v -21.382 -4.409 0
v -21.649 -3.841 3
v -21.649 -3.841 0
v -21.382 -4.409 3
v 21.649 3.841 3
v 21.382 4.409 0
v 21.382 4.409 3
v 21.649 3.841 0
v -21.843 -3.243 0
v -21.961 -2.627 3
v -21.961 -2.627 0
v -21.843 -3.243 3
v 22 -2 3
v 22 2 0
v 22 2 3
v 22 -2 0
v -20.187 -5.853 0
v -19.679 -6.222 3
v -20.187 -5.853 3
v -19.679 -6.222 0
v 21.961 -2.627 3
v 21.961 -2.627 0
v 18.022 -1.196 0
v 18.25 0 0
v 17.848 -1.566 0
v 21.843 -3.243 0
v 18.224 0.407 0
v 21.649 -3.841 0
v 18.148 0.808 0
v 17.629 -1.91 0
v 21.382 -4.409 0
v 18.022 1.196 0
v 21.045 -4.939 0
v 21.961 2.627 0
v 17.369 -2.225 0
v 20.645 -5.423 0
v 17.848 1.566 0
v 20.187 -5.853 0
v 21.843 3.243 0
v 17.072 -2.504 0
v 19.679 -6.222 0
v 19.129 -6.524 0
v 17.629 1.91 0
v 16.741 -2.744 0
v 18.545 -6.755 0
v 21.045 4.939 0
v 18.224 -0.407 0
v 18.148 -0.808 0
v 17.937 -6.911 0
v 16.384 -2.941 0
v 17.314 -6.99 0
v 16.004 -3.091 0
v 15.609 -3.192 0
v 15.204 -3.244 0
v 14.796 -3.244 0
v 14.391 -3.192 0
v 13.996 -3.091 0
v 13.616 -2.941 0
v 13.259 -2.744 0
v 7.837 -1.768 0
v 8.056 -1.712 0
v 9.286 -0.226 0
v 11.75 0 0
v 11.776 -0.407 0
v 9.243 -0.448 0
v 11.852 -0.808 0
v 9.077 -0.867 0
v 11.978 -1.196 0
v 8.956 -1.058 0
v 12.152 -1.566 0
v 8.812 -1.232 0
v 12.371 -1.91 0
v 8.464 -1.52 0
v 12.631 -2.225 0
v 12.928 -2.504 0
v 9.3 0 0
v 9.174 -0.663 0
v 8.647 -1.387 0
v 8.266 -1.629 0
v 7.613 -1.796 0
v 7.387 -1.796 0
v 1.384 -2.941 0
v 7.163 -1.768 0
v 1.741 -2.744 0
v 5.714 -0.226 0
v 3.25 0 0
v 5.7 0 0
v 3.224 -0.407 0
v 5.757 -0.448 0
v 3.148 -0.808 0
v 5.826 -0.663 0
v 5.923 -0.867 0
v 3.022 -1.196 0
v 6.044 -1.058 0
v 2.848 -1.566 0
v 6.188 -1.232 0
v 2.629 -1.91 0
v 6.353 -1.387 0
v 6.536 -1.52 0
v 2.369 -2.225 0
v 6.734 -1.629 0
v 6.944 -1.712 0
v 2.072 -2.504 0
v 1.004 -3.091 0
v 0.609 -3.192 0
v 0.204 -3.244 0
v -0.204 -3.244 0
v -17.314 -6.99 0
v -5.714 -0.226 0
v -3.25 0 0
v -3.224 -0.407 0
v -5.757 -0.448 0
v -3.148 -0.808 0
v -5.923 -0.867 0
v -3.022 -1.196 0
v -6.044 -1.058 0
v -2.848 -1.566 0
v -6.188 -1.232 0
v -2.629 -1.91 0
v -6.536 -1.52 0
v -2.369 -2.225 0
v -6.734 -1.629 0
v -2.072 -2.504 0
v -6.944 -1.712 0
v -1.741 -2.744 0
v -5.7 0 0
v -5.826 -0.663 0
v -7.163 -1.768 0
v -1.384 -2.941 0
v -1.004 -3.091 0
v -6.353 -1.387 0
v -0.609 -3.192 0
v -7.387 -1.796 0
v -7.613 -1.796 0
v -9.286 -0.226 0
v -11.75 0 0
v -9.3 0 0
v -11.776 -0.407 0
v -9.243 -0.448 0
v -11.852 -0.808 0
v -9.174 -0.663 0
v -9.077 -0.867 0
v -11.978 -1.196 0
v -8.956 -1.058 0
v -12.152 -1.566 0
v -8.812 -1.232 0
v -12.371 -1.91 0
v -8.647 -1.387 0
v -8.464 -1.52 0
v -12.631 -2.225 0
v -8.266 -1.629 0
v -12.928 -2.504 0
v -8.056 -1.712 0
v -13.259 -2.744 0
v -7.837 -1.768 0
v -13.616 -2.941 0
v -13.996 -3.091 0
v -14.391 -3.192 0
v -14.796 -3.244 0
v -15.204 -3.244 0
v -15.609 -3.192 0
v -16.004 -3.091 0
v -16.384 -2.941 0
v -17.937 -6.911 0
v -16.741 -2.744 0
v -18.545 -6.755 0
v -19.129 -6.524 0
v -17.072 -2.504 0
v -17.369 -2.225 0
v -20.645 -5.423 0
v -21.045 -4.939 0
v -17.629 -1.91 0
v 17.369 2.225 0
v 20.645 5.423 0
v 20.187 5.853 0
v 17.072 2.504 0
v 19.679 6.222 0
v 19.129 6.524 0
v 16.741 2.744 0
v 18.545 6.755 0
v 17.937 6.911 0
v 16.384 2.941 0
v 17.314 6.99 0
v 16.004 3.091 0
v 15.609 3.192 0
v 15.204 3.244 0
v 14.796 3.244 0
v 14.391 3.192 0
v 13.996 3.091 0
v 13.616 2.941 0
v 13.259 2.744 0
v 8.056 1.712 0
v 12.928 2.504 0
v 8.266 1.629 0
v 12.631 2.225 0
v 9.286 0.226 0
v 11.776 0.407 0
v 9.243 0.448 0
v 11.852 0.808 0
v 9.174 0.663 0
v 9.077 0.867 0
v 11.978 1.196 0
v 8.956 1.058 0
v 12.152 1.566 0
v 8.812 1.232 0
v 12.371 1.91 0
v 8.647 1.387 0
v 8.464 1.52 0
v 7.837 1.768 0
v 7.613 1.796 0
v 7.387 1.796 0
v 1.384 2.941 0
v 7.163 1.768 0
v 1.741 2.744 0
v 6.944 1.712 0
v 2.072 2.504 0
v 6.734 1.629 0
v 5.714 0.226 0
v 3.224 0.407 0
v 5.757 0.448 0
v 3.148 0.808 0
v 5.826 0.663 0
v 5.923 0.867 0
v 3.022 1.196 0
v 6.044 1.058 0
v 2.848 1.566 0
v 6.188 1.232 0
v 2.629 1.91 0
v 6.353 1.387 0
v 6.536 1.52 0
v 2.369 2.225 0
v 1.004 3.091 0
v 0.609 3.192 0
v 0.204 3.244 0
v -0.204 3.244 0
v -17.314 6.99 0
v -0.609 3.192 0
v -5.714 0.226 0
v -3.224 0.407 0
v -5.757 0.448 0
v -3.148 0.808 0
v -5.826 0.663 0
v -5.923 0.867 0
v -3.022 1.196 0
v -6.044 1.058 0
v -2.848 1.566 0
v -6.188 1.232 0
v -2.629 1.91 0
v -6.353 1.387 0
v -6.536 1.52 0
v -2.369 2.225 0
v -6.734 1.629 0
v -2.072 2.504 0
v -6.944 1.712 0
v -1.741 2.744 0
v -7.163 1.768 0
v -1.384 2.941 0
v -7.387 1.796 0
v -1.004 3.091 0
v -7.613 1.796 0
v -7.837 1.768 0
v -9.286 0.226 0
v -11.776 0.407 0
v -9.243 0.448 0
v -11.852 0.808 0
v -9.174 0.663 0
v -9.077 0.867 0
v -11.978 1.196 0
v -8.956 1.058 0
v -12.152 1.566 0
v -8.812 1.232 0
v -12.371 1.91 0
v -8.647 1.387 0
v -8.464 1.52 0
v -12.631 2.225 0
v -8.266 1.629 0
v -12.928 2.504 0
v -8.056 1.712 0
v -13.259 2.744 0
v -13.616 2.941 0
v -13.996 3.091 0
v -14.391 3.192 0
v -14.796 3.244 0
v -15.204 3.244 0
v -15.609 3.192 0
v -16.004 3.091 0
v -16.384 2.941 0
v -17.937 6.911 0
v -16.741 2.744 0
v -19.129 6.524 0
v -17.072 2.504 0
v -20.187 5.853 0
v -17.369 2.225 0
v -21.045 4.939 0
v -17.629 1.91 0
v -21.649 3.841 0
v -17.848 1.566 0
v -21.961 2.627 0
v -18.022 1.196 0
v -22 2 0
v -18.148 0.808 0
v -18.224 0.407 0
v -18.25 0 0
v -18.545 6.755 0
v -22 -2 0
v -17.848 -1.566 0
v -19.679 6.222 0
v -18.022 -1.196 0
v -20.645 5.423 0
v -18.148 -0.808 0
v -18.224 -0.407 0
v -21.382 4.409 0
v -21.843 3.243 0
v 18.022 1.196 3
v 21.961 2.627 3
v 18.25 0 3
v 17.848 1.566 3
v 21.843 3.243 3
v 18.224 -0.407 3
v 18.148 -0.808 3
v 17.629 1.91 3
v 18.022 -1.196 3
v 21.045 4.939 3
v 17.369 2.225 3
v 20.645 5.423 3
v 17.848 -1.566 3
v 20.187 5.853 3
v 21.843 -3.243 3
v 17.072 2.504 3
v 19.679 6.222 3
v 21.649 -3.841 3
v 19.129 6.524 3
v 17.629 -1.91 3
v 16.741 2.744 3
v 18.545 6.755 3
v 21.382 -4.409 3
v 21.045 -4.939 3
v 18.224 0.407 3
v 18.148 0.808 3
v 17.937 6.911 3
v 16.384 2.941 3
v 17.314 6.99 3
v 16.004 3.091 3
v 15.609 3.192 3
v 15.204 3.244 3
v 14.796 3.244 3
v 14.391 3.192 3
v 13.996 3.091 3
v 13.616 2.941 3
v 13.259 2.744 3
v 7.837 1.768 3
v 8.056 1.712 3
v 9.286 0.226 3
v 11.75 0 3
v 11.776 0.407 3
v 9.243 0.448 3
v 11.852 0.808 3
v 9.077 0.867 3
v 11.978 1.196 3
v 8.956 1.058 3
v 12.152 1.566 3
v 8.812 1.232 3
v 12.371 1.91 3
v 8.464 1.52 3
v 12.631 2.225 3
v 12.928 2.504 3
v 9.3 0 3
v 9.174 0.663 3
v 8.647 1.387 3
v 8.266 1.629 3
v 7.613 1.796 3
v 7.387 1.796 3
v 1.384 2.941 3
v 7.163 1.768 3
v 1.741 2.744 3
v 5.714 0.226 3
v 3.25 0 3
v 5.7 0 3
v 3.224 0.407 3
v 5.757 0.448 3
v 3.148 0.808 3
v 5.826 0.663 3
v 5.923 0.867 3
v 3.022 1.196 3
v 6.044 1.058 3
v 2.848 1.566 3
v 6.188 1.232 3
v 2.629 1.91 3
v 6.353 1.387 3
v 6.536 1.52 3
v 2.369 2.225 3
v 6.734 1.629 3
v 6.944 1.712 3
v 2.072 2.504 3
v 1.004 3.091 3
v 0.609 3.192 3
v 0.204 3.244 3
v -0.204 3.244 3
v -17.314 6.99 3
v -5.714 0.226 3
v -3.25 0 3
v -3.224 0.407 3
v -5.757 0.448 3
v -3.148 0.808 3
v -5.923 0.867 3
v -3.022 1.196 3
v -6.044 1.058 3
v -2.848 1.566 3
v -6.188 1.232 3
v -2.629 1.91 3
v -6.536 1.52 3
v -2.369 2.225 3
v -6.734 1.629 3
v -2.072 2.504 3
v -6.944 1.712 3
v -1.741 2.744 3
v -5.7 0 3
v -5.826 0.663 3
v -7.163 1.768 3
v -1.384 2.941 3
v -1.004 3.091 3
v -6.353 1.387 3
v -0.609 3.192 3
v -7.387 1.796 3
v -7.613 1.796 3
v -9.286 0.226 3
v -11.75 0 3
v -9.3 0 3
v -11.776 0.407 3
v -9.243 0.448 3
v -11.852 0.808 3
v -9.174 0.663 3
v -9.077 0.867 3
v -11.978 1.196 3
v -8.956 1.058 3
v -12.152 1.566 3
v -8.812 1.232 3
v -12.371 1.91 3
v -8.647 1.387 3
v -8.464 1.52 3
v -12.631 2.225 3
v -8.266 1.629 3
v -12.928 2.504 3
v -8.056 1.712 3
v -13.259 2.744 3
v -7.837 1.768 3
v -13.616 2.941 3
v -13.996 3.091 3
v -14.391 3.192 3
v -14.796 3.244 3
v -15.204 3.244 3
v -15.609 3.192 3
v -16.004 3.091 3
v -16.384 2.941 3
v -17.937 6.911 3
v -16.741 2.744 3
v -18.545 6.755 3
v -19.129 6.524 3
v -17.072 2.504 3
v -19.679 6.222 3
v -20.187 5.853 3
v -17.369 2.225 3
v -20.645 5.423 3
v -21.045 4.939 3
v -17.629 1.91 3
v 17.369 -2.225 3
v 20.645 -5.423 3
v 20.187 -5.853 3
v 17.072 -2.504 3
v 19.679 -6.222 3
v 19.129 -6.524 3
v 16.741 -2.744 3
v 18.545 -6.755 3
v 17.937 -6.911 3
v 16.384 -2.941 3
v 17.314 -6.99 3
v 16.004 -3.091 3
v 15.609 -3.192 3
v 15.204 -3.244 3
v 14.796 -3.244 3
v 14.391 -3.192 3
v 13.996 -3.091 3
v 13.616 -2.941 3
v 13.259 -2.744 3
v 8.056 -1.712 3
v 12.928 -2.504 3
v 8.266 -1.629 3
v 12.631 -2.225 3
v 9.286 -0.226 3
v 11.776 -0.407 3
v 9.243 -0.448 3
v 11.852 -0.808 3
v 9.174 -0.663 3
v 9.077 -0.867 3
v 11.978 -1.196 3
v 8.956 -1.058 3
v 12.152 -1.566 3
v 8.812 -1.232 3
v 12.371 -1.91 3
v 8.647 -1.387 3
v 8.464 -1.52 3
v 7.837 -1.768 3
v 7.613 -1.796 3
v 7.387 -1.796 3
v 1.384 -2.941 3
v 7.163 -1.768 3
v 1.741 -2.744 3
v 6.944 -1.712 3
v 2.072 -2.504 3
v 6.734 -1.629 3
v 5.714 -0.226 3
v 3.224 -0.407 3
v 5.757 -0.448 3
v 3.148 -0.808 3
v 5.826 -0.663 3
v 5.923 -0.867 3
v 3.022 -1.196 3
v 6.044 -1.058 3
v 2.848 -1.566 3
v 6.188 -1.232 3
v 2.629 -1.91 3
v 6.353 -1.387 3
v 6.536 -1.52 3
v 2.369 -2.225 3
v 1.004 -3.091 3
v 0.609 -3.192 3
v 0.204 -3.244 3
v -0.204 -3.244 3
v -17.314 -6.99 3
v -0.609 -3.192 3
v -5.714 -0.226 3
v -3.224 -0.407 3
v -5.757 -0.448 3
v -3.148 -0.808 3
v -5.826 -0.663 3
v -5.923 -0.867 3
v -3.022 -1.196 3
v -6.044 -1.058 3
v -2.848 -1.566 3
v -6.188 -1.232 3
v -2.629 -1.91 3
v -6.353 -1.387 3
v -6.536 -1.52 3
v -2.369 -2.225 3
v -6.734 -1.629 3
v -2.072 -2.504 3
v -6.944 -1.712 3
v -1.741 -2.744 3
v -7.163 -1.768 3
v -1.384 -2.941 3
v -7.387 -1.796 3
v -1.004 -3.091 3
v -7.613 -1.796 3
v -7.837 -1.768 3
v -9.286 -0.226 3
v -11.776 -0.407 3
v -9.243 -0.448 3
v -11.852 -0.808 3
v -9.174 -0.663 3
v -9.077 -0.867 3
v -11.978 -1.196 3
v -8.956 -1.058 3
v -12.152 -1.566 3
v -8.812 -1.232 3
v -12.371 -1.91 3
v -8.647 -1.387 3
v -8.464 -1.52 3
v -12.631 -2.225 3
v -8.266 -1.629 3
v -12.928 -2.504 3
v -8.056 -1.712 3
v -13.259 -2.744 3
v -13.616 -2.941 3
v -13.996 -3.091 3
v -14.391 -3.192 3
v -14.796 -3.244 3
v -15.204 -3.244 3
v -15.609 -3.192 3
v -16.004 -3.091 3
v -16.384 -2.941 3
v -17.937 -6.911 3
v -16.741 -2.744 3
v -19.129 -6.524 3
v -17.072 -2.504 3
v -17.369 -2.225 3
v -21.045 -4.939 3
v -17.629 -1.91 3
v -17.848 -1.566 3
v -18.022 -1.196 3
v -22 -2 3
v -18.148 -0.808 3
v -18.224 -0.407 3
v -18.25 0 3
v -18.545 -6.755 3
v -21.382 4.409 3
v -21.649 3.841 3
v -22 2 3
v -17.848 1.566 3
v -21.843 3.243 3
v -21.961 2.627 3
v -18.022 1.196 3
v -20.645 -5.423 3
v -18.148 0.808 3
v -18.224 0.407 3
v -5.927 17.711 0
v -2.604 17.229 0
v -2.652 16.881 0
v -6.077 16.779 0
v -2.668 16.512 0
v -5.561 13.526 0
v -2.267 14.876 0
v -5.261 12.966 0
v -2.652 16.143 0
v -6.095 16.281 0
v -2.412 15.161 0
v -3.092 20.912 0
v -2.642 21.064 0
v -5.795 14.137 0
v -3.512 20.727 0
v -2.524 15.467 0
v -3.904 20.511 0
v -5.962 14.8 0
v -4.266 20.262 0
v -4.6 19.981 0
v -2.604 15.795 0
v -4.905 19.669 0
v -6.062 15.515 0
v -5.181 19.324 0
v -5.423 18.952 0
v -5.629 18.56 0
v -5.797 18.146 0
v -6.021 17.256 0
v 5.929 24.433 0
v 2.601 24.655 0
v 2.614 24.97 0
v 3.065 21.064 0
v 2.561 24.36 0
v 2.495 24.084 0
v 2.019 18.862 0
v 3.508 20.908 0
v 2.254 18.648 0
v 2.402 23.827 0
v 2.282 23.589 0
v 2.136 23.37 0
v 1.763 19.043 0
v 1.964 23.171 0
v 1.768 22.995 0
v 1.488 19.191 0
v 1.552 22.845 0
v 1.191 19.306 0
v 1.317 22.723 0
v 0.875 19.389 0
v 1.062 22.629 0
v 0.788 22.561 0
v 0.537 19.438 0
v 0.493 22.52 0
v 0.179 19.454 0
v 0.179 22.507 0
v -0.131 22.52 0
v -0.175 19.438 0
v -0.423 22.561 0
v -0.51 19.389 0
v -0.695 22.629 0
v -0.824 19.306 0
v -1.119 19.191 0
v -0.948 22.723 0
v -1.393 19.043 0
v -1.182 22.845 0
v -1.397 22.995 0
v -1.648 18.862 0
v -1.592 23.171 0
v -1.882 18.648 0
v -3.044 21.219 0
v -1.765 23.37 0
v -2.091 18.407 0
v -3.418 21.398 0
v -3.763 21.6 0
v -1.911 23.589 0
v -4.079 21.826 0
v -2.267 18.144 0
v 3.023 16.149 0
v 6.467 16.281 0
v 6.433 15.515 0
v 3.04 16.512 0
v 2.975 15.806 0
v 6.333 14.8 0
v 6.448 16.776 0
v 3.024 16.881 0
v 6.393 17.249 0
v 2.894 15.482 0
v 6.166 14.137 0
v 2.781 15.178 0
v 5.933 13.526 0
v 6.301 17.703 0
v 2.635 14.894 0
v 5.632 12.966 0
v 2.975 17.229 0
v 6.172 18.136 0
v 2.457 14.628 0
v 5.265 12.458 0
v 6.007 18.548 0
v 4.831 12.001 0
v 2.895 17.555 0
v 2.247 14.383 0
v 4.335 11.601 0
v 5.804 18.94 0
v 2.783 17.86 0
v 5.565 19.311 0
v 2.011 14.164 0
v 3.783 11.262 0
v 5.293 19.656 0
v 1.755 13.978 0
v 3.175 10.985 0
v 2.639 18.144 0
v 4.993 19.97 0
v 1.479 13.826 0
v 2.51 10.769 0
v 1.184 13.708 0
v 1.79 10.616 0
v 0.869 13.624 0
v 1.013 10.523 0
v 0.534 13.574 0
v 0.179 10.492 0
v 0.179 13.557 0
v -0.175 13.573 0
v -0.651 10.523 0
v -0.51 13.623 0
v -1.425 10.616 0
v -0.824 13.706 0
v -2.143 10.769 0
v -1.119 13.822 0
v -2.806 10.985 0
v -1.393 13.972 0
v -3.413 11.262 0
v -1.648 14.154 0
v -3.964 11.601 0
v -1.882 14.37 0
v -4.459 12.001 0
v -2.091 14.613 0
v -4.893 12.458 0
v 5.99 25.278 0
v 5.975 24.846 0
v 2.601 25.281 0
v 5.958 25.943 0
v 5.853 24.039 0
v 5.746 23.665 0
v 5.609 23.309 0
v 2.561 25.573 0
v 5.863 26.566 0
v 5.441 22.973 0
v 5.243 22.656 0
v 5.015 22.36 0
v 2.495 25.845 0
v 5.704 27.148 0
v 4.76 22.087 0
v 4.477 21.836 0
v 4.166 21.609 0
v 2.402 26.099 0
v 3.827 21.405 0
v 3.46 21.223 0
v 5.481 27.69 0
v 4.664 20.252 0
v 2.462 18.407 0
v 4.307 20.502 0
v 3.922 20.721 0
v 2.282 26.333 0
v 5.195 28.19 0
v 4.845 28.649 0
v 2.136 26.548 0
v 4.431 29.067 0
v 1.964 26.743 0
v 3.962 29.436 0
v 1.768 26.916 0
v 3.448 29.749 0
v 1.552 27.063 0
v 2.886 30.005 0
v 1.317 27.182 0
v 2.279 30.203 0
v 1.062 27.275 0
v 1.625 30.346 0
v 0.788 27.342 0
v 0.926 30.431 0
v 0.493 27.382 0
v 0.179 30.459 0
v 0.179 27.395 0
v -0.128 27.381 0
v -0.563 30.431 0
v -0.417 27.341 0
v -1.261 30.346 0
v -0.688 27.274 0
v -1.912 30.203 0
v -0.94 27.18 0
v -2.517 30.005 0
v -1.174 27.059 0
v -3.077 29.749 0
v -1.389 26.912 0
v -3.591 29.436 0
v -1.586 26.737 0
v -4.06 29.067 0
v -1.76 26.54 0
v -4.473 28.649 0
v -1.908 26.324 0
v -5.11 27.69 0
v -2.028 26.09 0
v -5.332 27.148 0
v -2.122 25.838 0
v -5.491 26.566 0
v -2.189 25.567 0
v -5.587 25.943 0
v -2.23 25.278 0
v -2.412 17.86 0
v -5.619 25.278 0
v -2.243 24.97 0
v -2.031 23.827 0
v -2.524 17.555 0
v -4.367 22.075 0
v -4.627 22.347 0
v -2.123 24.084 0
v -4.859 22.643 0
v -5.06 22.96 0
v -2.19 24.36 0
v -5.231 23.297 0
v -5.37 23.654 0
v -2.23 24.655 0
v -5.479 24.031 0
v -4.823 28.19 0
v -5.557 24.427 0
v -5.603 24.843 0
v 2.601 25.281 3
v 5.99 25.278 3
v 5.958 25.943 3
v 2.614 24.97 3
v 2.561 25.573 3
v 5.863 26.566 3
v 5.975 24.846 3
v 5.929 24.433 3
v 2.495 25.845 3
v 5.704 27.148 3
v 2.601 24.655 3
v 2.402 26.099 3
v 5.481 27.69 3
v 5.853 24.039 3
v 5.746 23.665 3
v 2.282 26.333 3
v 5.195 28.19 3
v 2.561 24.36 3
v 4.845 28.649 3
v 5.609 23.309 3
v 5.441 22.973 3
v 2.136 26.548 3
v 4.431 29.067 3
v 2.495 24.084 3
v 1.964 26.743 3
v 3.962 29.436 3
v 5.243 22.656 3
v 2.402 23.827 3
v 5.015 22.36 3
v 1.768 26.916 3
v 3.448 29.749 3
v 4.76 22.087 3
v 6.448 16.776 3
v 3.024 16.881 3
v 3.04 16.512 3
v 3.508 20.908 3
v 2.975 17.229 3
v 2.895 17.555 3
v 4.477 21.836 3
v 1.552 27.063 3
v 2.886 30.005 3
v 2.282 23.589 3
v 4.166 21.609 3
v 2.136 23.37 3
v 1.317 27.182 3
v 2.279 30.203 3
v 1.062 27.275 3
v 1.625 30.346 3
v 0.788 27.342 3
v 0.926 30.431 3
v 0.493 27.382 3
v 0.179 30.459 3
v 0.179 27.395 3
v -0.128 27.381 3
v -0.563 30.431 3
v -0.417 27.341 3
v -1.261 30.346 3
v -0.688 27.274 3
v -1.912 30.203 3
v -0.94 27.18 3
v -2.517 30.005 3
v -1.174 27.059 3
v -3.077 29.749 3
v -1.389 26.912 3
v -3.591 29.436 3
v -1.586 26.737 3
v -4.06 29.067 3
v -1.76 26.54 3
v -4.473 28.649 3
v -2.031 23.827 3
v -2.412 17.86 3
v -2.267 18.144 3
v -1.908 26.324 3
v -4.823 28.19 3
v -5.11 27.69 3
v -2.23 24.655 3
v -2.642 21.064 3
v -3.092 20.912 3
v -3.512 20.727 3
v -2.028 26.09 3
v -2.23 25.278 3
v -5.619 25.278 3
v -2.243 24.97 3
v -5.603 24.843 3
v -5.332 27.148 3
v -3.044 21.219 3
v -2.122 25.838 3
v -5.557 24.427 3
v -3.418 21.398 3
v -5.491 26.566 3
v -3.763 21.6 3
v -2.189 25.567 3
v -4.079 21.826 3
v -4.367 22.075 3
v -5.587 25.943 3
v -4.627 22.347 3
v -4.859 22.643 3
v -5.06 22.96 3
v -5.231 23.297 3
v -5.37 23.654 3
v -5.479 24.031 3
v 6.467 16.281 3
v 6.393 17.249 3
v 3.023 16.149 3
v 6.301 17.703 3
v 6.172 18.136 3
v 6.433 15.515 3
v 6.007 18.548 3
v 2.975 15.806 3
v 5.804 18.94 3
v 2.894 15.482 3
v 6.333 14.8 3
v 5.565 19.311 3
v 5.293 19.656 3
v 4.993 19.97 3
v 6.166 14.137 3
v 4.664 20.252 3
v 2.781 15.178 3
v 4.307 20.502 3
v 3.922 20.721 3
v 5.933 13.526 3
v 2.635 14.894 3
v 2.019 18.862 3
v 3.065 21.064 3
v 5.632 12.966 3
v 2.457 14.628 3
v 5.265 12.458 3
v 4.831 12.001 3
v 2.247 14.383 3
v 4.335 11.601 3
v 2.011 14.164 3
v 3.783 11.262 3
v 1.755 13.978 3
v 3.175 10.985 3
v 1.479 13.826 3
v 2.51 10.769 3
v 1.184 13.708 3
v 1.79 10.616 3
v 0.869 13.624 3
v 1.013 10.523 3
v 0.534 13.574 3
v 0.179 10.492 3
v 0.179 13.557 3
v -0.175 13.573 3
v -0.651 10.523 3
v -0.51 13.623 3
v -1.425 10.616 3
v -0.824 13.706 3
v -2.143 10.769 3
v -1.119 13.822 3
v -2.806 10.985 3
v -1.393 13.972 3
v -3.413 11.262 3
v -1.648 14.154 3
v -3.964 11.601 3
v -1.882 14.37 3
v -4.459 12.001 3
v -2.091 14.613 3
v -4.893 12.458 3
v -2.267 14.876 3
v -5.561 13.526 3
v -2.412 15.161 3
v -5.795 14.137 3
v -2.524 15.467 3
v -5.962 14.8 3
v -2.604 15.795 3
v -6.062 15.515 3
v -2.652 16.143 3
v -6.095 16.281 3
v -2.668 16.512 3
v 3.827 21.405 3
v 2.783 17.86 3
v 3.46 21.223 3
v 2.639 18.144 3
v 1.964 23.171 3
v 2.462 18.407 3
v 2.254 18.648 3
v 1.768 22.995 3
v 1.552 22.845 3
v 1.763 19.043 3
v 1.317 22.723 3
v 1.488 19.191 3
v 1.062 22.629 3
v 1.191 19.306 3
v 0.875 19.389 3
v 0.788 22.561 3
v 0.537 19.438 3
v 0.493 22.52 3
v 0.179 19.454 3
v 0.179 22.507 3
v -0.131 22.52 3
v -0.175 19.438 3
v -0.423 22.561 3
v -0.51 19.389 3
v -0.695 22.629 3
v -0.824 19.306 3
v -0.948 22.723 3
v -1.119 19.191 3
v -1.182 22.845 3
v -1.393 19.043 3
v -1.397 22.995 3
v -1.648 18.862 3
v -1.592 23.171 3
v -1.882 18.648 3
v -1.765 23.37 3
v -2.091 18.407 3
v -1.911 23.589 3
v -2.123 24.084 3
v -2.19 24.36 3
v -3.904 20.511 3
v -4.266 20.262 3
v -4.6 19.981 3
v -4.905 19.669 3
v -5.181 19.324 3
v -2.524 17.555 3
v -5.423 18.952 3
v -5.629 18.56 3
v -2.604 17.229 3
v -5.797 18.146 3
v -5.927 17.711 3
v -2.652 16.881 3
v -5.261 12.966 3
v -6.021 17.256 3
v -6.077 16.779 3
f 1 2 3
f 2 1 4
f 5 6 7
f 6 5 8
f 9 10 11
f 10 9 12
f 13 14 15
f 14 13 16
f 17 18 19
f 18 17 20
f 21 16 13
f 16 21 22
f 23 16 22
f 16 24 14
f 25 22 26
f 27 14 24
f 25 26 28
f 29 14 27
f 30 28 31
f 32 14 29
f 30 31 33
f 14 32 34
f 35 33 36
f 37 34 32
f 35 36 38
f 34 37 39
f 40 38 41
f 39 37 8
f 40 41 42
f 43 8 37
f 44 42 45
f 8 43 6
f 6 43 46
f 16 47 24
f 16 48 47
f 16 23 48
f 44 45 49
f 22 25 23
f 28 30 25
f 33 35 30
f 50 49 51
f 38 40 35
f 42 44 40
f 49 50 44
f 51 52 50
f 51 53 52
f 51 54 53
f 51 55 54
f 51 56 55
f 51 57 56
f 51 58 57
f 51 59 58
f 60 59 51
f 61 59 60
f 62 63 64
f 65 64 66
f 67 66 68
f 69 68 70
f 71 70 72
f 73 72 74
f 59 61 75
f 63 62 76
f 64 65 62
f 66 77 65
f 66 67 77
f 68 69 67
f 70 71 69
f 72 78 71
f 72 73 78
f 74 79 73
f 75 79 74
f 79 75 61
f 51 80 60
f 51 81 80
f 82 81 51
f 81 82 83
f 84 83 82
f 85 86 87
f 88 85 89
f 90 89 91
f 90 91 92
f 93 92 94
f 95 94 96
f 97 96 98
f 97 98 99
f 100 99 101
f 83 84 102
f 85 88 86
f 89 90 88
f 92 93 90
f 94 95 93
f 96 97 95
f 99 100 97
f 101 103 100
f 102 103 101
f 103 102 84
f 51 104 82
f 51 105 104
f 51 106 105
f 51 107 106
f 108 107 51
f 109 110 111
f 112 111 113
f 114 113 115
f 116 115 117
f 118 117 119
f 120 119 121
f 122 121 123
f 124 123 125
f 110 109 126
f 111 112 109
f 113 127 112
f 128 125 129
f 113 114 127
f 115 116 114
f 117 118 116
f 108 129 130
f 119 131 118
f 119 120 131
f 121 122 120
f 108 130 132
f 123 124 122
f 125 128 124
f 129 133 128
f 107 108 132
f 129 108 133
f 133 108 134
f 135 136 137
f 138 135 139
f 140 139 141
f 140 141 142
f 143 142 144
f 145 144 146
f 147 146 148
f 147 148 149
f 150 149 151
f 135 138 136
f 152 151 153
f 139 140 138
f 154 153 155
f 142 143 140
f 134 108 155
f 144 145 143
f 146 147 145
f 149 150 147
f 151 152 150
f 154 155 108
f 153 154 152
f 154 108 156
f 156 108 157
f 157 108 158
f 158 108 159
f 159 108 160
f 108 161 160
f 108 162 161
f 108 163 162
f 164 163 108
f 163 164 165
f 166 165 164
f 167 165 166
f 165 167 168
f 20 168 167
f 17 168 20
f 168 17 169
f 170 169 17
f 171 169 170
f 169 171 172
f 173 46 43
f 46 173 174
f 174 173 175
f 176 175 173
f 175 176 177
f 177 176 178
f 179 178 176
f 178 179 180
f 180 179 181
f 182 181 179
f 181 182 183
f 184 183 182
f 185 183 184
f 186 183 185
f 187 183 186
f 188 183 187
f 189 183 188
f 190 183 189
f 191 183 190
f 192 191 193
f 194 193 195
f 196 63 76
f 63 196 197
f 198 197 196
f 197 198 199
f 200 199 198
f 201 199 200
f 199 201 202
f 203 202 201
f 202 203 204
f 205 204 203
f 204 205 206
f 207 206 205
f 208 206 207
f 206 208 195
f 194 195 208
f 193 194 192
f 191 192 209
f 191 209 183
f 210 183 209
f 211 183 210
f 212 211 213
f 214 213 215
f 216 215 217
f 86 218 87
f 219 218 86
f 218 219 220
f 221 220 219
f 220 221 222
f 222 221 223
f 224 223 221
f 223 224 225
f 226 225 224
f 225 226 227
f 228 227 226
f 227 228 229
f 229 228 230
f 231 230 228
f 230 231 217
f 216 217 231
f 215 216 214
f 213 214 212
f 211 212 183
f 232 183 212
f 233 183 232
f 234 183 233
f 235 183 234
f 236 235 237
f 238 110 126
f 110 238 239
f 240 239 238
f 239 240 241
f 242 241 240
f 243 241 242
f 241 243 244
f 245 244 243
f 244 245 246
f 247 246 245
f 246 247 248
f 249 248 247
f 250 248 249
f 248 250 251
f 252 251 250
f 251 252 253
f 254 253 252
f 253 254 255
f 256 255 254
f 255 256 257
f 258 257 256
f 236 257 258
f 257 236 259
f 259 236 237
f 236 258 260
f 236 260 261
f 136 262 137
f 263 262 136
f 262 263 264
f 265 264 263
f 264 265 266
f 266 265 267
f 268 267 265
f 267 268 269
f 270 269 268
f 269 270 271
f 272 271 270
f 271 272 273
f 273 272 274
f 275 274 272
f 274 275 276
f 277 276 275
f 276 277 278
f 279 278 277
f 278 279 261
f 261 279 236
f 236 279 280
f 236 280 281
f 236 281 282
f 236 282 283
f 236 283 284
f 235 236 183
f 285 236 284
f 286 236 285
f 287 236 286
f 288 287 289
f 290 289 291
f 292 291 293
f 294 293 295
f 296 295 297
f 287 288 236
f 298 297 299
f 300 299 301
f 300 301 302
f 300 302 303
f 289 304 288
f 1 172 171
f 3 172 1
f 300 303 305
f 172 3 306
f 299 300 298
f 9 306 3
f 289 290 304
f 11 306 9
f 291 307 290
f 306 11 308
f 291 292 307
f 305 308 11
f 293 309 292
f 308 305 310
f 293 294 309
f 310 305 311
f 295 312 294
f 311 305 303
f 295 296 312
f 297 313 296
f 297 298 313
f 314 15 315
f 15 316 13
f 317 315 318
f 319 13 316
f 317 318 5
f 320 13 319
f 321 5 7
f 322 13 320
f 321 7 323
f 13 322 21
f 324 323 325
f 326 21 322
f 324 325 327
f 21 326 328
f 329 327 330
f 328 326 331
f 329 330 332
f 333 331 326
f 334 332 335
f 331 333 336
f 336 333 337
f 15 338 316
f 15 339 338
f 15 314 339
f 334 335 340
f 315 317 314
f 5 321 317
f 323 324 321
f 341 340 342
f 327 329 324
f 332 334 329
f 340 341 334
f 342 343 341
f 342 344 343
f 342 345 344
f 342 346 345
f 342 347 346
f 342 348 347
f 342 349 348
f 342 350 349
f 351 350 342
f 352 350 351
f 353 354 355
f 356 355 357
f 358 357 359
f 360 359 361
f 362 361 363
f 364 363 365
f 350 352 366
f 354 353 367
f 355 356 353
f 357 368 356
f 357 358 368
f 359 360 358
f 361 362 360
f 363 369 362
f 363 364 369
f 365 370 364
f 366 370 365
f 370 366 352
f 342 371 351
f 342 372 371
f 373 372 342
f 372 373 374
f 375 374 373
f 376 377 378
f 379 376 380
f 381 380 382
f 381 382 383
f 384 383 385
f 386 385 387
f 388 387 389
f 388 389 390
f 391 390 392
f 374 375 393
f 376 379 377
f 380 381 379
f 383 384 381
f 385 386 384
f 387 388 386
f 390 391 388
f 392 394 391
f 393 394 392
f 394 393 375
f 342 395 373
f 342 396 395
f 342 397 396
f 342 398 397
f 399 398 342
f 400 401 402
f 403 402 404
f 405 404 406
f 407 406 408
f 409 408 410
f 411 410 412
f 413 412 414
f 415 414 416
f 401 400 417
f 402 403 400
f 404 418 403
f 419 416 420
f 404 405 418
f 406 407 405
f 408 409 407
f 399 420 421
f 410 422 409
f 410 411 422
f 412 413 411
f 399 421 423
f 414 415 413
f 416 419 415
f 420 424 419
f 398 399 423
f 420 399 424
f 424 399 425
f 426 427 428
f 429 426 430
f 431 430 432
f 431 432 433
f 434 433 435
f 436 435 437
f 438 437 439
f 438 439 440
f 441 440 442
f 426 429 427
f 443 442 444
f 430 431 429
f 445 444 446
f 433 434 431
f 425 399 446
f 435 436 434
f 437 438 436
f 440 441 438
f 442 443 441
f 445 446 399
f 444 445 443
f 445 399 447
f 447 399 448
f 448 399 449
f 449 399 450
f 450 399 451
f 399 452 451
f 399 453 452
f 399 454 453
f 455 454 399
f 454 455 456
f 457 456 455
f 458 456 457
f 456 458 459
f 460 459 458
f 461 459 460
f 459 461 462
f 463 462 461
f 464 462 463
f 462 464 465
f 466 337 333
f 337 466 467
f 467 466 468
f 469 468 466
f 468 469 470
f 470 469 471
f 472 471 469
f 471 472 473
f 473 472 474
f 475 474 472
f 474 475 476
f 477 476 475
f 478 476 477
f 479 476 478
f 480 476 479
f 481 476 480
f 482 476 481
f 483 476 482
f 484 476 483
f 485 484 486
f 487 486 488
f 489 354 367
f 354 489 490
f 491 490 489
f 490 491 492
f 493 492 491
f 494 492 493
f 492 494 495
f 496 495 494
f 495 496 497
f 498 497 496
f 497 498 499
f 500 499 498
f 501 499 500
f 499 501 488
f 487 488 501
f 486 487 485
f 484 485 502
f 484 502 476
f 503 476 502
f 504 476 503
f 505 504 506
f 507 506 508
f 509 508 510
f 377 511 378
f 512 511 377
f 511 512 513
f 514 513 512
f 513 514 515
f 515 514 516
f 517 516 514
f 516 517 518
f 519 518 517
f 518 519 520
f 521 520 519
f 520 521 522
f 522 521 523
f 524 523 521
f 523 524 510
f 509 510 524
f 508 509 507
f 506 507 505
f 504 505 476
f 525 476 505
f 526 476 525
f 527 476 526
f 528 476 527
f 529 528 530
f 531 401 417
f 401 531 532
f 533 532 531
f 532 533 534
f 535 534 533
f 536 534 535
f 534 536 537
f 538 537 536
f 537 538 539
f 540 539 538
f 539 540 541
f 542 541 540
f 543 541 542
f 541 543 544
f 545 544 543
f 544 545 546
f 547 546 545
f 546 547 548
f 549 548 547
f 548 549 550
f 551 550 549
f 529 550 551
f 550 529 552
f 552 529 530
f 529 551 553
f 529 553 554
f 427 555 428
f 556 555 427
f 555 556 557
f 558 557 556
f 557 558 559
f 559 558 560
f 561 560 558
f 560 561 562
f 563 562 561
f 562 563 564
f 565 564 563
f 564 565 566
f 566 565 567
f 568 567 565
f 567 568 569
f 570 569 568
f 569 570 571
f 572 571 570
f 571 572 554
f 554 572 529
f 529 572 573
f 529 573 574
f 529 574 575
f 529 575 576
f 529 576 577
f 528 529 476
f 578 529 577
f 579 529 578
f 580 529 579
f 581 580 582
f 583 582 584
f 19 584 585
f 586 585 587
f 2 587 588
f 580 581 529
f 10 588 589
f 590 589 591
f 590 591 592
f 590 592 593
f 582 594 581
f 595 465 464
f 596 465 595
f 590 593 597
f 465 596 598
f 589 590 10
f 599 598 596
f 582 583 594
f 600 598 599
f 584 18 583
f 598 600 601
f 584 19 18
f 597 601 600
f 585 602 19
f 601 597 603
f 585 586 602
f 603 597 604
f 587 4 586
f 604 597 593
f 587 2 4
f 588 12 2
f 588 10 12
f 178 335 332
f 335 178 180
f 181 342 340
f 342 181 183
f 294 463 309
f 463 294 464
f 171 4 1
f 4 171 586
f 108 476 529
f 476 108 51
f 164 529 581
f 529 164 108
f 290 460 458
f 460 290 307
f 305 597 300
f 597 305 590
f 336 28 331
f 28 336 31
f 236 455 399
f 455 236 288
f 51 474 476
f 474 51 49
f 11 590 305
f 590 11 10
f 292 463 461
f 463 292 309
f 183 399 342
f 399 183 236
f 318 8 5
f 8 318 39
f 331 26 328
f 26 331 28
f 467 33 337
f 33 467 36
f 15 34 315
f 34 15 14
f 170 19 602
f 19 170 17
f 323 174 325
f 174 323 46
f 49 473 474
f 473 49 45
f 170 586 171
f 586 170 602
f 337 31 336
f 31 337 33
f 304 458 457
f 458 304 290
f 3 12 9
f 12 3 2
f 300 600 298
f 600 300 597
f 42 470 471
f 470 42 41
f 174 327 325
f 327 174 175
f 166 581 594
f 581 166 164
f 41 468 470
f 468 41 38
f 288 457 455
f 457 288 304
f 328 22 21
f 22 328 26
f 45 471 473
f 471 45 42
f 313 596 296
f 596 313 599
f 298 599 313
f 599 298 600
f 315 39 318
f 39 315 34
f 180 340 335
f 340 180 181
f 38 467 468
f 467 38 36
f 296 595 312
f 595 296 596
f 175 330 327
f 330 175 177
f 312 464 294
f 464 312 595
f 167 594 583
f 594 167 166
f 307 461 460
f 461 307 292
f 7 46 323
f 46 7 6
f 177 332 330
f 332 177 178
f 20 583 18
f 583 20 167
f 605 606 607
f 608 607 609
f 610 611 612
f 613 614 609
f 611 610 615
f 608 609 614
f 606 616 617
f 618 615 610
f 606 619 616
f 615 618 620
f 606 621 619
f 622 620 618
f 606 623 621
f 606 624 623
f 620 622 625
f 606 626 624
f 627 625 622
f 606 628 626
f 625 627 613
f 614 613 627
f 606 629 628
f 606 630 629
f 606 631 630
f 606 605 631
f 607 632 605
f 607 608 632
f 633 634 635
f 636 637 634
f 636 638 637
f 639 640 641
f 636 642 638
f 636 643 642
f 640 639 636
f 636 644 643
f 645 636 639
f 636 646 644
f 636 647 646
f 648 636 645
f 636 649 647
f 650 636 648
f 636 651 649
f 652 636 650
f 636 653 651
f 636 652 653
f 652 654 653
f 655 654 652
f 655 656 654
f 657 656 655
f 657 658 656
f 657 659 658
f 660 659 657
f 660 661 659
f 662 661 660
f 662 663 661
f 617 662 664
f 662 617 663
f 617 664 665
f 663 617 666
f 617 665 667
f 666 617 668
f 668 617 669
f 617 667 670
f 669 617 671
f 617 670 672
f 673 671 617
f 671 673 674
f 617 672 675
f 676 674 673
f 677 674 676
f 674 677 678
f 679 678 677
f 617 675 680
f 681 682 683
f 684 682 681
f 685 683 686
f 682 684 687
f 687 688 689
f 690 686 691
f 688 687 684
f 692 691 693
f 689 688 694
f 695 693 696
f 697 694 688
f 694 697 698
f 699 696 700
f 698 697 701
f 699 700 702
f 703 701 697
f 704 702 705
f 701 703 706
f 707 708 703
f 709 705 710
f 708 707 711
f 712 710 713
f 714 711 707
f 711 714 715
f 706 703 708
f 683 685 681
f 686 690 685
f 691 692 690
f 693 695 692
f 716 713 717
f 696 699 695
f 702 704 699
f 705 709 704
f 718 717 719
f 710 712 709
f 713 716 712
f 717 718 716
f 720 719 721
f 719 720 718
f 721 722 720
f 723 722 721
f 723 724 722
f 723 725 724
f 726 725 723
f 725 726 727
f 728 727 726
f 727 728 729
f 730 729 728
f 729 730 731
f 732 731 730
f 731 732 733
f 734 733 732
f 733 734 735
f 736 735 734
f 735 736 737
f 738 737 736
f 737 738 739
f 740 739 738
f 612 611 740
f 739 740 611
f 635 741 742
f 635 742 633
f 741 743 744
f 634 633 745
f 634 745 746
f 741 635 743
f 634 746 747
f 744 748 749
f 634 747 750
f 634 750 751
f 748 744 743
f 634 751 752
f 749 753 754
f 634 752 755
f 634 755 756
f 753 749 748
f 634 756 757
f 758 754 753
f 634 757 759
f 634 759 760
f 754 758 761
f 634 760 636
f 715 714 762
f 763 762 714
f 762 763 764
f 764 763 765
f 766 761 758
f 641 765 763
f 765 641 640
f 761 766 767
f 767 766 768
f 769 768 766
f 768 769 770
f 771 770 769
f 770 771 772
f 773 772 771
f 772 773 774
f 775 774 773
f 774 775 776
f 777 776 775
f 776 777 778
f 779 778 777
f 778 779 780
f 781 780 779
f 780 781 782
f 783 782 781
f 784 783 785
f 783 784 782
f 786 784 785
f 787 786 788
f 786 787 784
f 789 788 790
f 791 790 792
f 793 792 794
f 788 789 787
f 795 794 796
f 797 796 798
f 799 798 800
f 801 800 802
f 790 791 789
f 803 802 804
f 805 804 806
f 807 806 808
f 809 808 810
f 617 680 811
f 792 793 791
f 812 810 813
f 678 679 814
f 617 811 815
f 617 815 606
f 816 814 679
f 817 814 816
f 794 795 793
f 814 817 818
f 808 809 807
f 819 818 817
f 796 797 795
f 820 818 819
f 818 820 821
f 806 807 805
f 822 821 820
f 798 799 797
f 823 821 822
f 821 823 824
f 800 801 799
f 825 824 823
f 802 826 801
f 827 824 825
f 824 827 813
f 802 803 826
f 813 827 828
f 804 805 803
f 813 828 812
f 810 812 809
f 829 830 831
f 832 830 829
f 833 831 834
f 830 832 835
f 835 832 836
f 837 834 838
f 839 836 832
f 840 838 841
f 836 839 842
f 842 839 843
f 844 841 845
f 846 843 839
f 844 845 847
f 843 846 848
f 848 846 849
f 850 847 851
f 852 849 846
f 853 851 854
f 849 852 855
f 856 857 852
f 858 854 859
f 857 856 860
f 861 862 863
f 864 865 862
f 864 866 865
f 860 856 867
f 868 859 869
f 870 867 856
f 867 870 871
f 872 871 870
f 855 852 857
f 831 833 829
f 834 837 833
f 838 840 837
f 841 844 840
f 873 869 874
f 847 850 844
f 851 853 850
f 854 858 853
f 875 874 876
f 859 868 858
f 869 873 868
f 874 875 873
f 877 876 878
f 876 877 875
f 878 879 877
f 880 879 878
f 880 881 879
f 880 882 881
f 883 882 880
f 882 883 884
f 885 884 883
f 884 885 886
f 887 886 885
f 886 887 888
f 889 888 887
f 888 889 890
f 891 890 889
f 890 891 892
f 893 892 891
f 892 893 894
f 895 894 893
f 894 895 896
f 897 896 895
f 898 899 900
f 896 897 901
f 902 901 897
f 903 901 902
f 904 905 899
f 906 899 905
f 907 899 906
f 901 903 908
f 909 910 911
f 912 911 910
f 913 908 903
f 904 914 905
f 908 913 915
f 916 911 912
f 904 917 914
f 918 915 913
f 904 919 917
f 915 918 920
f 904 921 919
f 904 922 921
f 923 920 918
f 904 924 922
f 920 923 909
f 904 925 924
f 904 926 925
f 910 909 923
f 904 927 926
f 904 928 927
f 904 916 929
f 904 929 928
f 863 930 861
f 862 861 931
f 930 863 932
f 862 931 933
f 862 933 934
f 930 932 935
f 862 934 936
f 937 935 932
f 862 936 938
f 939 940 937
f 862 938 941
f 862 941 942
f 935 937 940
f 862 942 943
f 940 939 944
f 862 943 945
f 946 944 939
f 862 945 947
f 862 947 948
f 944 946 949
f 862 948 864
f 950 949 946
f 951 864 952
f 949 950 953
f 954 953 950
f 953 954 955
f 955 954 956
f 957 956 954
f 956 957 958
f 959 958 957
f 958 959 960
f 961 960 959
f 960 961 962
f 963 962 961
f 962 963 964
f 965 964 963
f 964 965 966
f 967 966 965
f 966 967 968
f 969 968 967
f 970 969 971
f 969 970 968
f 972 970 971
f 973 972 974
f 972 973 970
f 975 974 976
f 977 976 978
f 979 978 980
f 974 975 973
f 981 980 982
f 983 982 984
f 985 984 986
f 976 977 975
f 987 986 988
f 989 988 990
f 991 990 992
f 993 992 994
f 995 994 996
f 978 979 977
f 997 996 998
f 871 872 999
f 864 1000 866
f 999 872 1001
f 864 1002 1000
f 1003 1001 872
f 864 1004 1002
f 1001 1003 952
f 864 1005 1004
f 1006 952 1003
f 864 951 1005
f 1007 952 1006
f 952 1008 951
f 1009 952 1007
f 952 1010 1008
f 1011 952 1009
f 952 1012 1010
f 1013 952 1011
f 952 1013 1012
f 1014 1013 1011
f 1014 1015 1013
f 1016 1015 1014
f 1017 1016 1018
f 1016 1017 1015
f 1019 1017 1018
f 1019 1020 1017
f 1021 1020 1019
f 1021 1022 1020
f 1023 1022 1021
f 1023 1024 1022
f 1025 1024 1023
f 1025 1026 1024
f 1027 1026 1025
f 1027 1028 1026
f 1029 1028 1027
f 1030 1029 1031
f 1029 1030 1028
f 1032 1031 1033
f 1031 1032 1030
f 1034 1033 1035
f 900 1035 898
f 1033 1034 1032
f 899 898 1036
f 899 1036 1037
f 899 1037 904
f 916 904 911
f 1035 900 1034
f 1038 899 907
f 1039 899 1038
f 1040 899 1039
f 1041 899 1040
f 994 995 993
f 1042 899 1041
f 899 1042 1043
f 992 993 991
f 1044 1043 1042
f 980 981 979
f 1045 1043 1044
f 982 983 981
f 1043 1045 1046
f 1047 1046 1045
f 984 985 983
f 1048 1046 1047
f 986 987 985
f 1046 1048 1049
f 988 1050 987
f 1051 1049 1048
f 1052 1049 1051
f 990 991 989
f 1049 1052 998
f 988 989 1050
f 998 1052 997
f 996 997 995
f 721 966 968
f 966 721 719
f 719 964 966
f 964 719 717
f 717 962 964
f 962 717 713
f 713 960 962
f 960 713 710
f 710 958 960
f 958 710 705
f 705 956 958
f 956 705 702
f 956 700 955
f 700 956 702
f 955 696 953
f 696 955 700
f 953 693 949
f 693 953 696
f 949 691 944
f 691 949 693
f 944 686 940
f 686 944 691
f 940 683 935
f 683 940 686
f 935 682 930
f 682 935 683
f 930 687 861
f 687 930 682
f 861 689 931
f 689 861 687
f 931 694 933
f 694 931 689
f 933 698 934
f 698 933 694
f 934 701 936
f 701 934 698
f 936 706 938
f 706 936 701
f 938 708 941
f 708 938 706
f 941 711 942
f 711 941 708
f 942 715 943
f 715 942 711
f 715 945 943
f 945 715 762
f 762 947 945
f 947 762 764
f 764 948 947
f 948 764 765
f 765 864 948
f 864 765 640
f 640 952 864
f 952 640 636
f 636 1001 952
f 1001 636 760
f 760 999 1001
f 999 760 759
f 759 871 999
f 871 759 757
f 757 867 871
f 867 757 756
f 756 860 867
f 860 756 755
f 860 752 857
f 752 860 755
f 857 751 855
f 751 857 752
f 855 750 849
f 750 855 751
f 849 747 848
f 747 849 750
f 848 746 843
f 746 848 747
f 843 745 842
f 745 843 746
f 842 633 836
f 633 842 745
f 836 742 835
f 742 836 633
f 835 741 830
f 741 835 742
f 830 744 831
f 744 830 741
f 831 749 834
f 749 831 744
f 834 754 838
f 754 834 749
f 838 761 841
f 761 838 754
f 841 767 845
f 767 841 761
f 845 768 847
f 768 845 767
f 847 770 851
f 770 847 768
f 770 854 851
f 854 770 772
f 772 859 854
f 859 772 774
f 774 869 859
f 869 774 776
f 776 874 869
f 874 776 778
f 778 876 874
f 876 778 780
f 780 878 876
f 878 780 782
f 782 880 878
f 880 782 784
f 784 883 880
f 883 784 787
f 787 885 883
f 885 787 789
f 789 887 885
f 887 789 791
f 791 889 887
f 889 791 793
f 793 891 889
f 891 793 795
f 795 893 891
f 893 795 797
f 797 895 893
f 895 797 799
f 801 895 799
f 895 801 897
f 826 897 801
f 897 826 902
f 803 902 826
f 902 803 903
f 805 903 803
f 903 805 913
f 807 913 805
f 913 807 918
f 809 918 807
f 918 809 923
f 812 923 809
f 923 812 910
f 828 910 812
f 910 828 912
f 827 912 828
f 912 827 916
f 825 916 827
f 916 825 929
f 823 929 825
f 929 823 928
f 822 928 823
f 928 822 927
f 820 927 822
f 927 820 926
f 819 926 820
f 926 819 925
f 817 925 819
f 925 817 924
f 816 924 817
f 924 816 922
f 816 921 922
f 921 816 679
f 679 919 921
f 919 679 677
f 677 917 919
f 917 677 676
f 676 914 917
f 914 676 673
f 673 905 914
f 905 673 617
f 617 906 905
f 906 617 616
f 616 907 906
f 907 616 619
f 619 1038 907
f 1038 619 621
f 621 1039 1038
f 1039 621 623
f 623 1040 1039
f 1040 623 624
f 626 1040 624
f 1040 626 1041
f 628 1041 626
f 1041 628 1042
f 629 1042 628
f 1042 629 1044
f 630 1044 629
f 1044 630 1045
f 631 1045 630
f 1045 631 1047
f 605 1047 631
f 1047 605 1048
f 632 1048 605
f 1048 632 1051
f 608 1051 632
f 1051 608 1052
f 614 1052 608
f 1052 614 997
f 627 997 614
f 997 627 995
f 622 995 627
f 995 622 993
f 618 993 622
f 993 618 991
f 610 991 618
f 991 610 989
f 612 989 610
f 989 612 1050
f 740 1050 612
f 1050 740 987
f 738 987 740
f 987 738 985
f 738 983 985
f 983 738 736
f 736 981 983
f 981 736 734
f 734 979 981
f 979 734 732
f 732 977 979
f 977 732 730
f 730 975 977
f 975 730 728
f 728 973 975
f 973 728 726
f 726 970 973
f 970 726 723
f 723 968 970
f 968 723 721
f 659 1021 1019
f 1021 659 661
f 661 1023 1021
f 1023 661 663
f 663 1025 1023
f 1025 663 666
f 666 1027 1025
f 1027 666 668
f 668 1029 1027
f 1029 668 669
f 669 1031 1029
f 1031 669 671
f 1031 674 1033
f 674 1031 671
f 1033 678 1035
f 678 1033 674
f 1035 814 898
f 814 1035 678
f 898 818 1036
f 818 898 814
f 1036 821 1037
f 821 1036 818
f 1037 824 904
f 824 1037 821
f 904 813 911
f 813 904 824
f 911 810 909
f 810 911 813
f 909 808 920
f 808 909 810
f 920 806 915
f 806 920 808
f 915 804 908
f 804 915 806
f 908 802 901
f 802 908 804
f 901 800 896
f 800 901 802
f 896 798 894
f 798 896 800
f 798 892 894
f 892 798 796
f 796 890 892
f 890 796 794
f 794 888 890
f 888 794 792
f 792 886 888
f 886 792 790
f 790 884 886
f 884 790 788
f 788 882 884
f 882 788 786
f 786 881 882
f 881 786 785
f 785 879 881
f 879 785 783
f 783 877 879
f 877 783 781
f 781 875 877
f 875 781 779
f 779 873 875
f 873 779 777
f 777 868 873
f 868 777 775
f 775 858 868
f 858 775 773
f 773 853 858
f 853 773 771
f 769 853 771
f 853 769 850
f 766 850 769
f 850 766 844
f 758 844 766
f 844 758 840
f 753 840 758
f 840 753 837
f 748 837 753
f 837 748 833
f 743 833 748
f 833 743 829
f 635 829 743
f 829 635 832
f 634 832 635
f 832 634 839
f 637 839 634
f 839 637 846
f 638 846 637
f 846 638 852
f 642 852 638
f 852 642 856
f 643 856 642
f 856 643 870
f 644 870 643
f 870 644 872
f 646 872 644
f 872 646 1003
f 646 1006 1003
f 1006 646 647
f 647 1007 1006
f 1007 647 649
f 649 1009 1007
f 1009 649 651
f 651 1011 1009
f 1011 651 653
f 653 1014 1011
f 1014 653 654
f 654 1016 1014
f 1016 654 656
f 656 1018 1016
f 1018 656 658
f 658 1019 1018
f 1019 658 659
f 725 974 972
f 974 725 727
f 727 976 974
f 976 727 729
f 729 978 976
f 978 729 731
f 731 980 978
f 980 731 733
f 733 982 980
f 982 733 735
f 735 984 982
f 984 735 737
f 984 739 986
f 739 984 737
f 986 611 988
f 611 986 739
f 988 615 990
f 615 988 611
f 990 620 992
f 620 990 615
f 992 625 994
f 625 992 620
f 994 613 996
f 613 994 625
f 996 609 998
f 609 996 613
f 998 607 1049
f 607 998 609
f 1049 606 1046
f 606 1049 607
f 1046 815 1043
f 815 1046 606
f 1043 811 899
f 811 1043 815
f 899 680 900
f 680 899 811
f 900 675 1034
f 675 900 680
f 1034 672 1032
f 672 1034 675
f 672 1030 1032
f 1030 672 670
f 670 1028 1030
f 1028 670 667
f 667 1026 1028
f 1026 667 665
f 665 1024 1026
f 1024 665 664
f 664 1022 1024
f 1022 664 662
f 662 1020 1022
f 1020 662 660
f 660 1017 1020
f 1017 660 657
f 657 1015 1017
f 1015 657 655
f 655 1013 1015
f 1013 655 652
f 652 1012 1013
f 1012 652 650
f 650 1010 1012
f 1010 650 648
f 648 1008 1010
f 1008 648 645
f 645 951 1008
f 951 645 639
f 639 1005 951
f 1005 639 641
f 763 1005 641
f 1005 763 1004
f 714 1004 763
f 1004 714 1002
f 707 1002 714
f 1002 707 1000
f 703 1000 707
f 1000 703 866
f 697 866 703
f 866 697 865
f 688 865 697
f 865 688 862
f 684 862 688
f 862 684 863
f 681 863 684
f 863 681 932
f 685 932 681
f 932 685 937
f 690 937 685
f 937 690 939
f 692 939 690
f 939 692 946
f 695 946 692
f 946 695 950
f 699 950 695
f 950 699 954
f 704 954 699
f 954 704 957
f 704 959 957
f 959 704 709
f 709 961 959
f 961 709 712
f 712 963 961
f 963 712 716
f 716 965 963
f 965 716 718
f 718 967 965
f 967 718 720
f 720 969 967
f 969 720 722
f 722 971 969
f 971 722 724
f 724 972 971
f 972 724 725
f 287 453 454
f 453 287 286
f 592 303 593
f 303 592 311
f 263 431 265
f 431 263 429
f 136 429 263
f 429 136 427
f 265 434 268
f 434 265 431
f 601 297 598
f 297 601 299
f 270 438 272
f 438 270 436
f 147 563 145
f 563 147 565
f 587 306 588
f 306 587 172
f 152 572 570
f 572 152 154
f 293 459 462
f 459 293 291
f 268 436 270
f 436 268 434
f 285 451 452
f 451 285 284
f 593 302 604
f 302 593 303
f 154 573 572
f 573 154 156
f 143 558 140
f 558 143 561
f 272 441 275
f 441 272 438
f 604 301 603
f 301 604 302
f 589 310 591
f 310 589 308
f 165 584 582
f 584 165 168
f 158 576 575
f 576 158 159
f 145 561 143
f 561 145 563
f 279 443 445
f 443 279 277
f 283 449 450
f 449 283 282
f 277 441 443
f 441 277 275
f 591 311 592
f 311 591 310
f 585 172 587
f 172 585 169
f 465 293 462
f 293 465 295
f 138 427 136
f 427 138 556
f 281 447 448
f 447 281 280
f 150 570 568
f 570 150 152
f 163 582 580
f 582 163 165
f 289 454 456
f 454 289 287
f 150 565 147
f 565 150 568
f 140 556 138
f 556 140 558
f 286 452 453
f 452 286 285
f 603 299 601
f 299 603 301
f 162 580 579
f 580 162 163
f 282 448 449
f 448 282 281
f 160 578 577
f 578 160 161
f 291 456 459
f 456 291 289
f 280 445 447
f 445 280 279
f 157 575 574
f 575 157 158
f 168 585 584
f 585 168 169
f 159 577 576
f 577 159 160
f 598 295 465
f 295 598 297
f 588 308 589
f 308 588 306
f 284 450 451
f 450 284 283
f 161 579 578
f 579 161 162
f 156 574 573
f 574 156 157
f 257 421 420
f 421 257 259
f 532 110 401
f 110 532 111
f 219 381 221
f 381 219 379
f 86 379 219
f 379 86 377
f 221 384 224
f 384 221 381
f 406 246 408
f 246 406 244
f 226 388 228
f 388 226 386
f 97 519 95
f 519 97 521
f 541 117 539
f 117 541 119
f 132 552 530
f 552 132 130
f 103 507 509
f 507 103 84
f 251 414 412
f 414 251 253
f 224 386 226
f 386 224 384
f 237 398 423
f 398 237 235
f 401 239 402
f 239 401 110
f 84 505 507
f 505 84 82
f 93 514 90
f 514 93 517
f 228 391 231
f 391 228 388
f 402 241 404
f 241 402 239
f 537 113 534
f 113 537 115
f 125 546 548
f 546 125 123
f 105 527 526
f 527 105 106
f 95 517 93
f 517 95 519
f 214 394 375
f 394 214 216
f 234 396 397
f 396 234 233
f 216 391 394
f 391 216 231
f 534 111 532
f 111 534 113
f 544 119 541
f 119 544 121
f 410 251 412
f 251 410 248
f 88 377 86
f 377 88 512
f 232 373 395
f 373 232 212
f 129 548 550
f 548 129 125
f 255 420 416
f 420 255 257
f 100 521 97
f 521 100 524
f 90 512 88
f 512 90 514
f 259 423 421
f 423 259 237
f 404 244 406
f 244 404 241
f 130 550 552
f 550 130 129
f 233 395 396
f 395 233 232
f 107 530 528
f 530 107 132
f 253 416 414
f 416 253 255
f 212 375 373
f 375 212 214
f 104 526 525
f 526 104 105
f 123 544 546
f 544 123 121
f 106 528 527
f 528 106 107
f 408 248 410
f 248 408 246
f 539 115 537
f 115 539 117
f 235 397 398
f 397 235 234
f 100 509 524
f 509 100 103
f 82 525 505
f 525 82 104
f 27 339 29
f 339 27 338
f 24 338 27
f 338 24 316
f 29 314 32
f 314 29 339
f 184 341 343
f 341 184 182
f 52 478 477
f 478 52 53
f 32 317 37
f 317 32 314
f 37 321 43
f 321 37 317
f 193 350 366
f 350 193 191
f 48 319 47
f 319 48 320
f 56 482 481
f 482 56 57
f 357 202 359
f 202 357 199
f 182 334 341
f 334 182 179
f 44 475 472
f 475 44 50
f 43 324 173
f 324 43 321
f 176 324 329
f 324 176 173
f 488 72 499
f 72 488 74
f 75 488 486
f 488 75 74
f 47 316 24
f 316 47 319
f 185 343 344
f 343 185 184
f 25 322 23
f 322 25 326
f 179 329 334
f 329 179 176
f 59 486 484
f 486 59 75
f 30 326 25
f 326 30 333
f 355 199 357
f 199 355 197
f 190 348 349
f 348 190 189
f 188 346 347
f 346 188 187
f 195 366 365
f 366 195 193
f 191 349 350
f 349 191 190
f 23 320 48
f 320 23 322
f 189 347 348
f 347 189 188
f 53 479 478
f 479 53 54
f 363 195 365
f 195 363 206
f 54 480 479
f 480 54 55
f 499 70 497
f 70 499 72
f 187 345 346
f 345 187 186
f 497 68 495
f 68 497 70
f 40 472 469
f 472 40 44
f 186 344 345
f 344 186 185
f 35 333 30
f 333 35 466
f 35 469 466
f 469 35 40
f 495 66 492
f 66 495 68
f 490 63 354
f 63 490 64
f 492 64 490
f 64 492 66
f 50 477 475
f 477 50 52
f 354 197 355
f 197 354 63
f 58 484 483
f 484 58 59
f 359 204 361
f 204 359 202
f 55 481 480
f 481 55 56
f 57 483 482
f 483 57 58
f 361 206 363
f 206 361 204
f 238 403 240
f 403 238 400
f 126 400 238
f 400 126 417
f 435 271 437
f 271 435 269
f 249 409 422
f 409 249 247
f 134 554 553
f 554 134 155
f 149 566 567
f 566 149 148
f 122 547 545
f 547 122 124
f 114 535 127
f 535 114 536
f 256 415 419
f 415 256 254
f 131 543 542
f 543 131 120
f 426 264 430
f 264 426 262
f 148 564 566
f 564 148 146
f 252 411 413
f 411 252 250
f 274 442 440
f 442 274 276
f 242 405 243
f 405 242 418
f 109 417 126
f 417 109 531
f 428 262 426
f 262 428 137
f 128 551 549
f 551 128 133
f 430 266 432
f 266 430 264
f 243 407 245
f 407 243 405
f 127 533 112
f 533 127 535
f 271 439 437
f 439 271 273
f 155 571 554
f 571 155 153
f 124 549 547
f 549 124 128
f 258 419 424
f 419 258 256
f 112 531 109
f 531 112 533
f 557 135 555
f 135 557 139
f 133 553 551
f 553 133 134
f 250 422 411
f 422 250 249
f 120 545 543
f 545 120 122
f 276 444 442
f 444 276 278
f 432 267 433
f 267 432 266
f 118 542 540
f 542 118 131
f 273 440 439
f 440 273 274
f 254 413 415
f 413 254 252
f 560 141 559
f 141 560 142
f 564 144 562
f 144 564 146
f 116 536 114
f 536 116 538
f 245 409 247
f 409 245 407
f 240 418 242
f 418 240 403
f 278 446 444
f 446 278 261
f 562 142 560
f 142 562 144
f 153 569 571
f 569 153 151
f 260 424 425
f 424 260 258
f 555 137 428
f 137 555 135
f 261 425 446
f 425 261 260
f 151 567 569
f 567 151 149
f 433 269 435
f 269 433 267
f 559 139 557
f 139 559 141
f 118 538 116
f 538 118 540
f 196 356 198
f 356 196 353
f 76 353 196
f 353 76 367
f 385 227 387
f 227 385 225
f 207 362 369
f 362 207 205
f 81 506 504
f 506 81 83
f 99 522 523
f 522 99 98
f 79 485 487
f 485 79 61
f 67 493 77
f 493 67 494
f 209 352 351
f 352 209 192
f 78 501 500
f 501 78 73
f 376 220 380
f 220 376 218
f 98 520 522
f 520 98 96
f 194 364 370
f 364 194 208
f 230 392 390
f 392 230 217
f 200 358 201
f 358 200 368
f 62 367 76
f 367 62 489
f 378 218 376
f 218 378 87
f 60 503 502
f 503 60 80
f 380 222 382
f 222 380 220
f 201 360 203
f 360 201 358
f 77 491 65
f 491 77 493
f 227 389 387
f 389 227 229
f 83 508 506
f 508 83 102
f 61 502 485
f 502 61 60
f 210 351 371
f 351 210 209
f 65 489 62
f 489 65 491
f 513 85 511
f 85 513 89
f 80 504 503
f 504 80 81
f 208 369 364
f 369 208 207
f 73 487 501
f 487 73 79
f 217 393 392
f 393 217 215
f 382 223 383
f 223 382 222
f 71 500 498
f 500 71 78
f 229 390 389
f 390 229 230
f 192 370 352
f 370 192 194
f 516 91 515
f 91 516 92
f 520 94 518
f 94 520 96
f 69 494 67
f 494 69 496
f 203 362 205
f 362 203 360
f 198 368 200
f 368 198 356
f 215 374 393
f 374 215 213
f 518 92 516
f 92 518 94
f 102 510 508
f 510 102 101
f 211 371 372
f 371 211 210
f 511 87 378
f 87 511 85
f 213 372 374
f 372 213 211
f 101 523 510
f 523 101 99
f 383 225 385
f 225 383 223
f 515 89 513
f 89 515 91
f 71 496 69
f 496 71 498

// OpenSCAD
$fn = 50;


difference() {
	union() {
		hull() {
			translate(v = [-17.0000000000, 2.0000000000, 0]) {
				cylinder(h = 3, r = 5);
			}
			translate(v = [17.0000000000, 2.0000000000, 0]) {
				cylinder(h = 3, r = 5);
			}
			translate(v = [-17.0000000000, -2.0000000000, 0]) {
				cylinder(h = 3, r = 5);
			}
			translate(v = [17.0000000000, -2.0000000000, 0]) {
				cylinder(h = 3, r = 5);
			}
		}
		translate(v = [0, 30.0000000000, 0]) {
			linear_extrude(height = 3) {
				text(font = "DejaVu Sans Mono:style=Bold", halign = "center", size = 19.0000000000, text = "8", valign = "top");
			}
		}
	}
	union() {
		translate(v = [-15.0000000000, 0.0000000000, 0]) {
			translate(v = [0, 0, -100]) {
				cylinder(h = 200, r = 3.2500000000);
			}
		}
		translate(v = [0, 0, -100]) {
			cylinder(h = 200, r = 3.2500000000);
		}
		translate(v = [15.0000000000, 0.0000000000, 0]) {
			translate(v = [0, 0, -100]) {
				cylinder(h = 200, r = 3.2500000000);
			}
		}
		translate(v = [-15.0000000000, 0.0000000000, 0]) {
			translate(v = [0, 0, -100]) {
				cylinder(h = 200, r = 1.8000000000);
			}
		}
		translate(v = [-7.5000000000, 0.0000000000, 0]) {
			translate(v = [0, 0, -100]) {
				cylinder(h = 200, r = 1.8000000000);
			}
		}
		translate(v = [0, 0, -100]) {
			cylinder(h = 200, r = 1.8000000000);
		}
		translate(v = [7.5000000000, 0.0000000000, 0]) {
			translate(v = [0, 0, -100]) {
				cylinder(h = 200, r = 1.8000000000);
			}
		}
		translate(v = [15.0000000000, 0.0000000000, 0]) {
			translate(v = [0, 0, -100]) {
				cylinder(h = 200, r = 1.8000000000);
			}
		}
	}
}
